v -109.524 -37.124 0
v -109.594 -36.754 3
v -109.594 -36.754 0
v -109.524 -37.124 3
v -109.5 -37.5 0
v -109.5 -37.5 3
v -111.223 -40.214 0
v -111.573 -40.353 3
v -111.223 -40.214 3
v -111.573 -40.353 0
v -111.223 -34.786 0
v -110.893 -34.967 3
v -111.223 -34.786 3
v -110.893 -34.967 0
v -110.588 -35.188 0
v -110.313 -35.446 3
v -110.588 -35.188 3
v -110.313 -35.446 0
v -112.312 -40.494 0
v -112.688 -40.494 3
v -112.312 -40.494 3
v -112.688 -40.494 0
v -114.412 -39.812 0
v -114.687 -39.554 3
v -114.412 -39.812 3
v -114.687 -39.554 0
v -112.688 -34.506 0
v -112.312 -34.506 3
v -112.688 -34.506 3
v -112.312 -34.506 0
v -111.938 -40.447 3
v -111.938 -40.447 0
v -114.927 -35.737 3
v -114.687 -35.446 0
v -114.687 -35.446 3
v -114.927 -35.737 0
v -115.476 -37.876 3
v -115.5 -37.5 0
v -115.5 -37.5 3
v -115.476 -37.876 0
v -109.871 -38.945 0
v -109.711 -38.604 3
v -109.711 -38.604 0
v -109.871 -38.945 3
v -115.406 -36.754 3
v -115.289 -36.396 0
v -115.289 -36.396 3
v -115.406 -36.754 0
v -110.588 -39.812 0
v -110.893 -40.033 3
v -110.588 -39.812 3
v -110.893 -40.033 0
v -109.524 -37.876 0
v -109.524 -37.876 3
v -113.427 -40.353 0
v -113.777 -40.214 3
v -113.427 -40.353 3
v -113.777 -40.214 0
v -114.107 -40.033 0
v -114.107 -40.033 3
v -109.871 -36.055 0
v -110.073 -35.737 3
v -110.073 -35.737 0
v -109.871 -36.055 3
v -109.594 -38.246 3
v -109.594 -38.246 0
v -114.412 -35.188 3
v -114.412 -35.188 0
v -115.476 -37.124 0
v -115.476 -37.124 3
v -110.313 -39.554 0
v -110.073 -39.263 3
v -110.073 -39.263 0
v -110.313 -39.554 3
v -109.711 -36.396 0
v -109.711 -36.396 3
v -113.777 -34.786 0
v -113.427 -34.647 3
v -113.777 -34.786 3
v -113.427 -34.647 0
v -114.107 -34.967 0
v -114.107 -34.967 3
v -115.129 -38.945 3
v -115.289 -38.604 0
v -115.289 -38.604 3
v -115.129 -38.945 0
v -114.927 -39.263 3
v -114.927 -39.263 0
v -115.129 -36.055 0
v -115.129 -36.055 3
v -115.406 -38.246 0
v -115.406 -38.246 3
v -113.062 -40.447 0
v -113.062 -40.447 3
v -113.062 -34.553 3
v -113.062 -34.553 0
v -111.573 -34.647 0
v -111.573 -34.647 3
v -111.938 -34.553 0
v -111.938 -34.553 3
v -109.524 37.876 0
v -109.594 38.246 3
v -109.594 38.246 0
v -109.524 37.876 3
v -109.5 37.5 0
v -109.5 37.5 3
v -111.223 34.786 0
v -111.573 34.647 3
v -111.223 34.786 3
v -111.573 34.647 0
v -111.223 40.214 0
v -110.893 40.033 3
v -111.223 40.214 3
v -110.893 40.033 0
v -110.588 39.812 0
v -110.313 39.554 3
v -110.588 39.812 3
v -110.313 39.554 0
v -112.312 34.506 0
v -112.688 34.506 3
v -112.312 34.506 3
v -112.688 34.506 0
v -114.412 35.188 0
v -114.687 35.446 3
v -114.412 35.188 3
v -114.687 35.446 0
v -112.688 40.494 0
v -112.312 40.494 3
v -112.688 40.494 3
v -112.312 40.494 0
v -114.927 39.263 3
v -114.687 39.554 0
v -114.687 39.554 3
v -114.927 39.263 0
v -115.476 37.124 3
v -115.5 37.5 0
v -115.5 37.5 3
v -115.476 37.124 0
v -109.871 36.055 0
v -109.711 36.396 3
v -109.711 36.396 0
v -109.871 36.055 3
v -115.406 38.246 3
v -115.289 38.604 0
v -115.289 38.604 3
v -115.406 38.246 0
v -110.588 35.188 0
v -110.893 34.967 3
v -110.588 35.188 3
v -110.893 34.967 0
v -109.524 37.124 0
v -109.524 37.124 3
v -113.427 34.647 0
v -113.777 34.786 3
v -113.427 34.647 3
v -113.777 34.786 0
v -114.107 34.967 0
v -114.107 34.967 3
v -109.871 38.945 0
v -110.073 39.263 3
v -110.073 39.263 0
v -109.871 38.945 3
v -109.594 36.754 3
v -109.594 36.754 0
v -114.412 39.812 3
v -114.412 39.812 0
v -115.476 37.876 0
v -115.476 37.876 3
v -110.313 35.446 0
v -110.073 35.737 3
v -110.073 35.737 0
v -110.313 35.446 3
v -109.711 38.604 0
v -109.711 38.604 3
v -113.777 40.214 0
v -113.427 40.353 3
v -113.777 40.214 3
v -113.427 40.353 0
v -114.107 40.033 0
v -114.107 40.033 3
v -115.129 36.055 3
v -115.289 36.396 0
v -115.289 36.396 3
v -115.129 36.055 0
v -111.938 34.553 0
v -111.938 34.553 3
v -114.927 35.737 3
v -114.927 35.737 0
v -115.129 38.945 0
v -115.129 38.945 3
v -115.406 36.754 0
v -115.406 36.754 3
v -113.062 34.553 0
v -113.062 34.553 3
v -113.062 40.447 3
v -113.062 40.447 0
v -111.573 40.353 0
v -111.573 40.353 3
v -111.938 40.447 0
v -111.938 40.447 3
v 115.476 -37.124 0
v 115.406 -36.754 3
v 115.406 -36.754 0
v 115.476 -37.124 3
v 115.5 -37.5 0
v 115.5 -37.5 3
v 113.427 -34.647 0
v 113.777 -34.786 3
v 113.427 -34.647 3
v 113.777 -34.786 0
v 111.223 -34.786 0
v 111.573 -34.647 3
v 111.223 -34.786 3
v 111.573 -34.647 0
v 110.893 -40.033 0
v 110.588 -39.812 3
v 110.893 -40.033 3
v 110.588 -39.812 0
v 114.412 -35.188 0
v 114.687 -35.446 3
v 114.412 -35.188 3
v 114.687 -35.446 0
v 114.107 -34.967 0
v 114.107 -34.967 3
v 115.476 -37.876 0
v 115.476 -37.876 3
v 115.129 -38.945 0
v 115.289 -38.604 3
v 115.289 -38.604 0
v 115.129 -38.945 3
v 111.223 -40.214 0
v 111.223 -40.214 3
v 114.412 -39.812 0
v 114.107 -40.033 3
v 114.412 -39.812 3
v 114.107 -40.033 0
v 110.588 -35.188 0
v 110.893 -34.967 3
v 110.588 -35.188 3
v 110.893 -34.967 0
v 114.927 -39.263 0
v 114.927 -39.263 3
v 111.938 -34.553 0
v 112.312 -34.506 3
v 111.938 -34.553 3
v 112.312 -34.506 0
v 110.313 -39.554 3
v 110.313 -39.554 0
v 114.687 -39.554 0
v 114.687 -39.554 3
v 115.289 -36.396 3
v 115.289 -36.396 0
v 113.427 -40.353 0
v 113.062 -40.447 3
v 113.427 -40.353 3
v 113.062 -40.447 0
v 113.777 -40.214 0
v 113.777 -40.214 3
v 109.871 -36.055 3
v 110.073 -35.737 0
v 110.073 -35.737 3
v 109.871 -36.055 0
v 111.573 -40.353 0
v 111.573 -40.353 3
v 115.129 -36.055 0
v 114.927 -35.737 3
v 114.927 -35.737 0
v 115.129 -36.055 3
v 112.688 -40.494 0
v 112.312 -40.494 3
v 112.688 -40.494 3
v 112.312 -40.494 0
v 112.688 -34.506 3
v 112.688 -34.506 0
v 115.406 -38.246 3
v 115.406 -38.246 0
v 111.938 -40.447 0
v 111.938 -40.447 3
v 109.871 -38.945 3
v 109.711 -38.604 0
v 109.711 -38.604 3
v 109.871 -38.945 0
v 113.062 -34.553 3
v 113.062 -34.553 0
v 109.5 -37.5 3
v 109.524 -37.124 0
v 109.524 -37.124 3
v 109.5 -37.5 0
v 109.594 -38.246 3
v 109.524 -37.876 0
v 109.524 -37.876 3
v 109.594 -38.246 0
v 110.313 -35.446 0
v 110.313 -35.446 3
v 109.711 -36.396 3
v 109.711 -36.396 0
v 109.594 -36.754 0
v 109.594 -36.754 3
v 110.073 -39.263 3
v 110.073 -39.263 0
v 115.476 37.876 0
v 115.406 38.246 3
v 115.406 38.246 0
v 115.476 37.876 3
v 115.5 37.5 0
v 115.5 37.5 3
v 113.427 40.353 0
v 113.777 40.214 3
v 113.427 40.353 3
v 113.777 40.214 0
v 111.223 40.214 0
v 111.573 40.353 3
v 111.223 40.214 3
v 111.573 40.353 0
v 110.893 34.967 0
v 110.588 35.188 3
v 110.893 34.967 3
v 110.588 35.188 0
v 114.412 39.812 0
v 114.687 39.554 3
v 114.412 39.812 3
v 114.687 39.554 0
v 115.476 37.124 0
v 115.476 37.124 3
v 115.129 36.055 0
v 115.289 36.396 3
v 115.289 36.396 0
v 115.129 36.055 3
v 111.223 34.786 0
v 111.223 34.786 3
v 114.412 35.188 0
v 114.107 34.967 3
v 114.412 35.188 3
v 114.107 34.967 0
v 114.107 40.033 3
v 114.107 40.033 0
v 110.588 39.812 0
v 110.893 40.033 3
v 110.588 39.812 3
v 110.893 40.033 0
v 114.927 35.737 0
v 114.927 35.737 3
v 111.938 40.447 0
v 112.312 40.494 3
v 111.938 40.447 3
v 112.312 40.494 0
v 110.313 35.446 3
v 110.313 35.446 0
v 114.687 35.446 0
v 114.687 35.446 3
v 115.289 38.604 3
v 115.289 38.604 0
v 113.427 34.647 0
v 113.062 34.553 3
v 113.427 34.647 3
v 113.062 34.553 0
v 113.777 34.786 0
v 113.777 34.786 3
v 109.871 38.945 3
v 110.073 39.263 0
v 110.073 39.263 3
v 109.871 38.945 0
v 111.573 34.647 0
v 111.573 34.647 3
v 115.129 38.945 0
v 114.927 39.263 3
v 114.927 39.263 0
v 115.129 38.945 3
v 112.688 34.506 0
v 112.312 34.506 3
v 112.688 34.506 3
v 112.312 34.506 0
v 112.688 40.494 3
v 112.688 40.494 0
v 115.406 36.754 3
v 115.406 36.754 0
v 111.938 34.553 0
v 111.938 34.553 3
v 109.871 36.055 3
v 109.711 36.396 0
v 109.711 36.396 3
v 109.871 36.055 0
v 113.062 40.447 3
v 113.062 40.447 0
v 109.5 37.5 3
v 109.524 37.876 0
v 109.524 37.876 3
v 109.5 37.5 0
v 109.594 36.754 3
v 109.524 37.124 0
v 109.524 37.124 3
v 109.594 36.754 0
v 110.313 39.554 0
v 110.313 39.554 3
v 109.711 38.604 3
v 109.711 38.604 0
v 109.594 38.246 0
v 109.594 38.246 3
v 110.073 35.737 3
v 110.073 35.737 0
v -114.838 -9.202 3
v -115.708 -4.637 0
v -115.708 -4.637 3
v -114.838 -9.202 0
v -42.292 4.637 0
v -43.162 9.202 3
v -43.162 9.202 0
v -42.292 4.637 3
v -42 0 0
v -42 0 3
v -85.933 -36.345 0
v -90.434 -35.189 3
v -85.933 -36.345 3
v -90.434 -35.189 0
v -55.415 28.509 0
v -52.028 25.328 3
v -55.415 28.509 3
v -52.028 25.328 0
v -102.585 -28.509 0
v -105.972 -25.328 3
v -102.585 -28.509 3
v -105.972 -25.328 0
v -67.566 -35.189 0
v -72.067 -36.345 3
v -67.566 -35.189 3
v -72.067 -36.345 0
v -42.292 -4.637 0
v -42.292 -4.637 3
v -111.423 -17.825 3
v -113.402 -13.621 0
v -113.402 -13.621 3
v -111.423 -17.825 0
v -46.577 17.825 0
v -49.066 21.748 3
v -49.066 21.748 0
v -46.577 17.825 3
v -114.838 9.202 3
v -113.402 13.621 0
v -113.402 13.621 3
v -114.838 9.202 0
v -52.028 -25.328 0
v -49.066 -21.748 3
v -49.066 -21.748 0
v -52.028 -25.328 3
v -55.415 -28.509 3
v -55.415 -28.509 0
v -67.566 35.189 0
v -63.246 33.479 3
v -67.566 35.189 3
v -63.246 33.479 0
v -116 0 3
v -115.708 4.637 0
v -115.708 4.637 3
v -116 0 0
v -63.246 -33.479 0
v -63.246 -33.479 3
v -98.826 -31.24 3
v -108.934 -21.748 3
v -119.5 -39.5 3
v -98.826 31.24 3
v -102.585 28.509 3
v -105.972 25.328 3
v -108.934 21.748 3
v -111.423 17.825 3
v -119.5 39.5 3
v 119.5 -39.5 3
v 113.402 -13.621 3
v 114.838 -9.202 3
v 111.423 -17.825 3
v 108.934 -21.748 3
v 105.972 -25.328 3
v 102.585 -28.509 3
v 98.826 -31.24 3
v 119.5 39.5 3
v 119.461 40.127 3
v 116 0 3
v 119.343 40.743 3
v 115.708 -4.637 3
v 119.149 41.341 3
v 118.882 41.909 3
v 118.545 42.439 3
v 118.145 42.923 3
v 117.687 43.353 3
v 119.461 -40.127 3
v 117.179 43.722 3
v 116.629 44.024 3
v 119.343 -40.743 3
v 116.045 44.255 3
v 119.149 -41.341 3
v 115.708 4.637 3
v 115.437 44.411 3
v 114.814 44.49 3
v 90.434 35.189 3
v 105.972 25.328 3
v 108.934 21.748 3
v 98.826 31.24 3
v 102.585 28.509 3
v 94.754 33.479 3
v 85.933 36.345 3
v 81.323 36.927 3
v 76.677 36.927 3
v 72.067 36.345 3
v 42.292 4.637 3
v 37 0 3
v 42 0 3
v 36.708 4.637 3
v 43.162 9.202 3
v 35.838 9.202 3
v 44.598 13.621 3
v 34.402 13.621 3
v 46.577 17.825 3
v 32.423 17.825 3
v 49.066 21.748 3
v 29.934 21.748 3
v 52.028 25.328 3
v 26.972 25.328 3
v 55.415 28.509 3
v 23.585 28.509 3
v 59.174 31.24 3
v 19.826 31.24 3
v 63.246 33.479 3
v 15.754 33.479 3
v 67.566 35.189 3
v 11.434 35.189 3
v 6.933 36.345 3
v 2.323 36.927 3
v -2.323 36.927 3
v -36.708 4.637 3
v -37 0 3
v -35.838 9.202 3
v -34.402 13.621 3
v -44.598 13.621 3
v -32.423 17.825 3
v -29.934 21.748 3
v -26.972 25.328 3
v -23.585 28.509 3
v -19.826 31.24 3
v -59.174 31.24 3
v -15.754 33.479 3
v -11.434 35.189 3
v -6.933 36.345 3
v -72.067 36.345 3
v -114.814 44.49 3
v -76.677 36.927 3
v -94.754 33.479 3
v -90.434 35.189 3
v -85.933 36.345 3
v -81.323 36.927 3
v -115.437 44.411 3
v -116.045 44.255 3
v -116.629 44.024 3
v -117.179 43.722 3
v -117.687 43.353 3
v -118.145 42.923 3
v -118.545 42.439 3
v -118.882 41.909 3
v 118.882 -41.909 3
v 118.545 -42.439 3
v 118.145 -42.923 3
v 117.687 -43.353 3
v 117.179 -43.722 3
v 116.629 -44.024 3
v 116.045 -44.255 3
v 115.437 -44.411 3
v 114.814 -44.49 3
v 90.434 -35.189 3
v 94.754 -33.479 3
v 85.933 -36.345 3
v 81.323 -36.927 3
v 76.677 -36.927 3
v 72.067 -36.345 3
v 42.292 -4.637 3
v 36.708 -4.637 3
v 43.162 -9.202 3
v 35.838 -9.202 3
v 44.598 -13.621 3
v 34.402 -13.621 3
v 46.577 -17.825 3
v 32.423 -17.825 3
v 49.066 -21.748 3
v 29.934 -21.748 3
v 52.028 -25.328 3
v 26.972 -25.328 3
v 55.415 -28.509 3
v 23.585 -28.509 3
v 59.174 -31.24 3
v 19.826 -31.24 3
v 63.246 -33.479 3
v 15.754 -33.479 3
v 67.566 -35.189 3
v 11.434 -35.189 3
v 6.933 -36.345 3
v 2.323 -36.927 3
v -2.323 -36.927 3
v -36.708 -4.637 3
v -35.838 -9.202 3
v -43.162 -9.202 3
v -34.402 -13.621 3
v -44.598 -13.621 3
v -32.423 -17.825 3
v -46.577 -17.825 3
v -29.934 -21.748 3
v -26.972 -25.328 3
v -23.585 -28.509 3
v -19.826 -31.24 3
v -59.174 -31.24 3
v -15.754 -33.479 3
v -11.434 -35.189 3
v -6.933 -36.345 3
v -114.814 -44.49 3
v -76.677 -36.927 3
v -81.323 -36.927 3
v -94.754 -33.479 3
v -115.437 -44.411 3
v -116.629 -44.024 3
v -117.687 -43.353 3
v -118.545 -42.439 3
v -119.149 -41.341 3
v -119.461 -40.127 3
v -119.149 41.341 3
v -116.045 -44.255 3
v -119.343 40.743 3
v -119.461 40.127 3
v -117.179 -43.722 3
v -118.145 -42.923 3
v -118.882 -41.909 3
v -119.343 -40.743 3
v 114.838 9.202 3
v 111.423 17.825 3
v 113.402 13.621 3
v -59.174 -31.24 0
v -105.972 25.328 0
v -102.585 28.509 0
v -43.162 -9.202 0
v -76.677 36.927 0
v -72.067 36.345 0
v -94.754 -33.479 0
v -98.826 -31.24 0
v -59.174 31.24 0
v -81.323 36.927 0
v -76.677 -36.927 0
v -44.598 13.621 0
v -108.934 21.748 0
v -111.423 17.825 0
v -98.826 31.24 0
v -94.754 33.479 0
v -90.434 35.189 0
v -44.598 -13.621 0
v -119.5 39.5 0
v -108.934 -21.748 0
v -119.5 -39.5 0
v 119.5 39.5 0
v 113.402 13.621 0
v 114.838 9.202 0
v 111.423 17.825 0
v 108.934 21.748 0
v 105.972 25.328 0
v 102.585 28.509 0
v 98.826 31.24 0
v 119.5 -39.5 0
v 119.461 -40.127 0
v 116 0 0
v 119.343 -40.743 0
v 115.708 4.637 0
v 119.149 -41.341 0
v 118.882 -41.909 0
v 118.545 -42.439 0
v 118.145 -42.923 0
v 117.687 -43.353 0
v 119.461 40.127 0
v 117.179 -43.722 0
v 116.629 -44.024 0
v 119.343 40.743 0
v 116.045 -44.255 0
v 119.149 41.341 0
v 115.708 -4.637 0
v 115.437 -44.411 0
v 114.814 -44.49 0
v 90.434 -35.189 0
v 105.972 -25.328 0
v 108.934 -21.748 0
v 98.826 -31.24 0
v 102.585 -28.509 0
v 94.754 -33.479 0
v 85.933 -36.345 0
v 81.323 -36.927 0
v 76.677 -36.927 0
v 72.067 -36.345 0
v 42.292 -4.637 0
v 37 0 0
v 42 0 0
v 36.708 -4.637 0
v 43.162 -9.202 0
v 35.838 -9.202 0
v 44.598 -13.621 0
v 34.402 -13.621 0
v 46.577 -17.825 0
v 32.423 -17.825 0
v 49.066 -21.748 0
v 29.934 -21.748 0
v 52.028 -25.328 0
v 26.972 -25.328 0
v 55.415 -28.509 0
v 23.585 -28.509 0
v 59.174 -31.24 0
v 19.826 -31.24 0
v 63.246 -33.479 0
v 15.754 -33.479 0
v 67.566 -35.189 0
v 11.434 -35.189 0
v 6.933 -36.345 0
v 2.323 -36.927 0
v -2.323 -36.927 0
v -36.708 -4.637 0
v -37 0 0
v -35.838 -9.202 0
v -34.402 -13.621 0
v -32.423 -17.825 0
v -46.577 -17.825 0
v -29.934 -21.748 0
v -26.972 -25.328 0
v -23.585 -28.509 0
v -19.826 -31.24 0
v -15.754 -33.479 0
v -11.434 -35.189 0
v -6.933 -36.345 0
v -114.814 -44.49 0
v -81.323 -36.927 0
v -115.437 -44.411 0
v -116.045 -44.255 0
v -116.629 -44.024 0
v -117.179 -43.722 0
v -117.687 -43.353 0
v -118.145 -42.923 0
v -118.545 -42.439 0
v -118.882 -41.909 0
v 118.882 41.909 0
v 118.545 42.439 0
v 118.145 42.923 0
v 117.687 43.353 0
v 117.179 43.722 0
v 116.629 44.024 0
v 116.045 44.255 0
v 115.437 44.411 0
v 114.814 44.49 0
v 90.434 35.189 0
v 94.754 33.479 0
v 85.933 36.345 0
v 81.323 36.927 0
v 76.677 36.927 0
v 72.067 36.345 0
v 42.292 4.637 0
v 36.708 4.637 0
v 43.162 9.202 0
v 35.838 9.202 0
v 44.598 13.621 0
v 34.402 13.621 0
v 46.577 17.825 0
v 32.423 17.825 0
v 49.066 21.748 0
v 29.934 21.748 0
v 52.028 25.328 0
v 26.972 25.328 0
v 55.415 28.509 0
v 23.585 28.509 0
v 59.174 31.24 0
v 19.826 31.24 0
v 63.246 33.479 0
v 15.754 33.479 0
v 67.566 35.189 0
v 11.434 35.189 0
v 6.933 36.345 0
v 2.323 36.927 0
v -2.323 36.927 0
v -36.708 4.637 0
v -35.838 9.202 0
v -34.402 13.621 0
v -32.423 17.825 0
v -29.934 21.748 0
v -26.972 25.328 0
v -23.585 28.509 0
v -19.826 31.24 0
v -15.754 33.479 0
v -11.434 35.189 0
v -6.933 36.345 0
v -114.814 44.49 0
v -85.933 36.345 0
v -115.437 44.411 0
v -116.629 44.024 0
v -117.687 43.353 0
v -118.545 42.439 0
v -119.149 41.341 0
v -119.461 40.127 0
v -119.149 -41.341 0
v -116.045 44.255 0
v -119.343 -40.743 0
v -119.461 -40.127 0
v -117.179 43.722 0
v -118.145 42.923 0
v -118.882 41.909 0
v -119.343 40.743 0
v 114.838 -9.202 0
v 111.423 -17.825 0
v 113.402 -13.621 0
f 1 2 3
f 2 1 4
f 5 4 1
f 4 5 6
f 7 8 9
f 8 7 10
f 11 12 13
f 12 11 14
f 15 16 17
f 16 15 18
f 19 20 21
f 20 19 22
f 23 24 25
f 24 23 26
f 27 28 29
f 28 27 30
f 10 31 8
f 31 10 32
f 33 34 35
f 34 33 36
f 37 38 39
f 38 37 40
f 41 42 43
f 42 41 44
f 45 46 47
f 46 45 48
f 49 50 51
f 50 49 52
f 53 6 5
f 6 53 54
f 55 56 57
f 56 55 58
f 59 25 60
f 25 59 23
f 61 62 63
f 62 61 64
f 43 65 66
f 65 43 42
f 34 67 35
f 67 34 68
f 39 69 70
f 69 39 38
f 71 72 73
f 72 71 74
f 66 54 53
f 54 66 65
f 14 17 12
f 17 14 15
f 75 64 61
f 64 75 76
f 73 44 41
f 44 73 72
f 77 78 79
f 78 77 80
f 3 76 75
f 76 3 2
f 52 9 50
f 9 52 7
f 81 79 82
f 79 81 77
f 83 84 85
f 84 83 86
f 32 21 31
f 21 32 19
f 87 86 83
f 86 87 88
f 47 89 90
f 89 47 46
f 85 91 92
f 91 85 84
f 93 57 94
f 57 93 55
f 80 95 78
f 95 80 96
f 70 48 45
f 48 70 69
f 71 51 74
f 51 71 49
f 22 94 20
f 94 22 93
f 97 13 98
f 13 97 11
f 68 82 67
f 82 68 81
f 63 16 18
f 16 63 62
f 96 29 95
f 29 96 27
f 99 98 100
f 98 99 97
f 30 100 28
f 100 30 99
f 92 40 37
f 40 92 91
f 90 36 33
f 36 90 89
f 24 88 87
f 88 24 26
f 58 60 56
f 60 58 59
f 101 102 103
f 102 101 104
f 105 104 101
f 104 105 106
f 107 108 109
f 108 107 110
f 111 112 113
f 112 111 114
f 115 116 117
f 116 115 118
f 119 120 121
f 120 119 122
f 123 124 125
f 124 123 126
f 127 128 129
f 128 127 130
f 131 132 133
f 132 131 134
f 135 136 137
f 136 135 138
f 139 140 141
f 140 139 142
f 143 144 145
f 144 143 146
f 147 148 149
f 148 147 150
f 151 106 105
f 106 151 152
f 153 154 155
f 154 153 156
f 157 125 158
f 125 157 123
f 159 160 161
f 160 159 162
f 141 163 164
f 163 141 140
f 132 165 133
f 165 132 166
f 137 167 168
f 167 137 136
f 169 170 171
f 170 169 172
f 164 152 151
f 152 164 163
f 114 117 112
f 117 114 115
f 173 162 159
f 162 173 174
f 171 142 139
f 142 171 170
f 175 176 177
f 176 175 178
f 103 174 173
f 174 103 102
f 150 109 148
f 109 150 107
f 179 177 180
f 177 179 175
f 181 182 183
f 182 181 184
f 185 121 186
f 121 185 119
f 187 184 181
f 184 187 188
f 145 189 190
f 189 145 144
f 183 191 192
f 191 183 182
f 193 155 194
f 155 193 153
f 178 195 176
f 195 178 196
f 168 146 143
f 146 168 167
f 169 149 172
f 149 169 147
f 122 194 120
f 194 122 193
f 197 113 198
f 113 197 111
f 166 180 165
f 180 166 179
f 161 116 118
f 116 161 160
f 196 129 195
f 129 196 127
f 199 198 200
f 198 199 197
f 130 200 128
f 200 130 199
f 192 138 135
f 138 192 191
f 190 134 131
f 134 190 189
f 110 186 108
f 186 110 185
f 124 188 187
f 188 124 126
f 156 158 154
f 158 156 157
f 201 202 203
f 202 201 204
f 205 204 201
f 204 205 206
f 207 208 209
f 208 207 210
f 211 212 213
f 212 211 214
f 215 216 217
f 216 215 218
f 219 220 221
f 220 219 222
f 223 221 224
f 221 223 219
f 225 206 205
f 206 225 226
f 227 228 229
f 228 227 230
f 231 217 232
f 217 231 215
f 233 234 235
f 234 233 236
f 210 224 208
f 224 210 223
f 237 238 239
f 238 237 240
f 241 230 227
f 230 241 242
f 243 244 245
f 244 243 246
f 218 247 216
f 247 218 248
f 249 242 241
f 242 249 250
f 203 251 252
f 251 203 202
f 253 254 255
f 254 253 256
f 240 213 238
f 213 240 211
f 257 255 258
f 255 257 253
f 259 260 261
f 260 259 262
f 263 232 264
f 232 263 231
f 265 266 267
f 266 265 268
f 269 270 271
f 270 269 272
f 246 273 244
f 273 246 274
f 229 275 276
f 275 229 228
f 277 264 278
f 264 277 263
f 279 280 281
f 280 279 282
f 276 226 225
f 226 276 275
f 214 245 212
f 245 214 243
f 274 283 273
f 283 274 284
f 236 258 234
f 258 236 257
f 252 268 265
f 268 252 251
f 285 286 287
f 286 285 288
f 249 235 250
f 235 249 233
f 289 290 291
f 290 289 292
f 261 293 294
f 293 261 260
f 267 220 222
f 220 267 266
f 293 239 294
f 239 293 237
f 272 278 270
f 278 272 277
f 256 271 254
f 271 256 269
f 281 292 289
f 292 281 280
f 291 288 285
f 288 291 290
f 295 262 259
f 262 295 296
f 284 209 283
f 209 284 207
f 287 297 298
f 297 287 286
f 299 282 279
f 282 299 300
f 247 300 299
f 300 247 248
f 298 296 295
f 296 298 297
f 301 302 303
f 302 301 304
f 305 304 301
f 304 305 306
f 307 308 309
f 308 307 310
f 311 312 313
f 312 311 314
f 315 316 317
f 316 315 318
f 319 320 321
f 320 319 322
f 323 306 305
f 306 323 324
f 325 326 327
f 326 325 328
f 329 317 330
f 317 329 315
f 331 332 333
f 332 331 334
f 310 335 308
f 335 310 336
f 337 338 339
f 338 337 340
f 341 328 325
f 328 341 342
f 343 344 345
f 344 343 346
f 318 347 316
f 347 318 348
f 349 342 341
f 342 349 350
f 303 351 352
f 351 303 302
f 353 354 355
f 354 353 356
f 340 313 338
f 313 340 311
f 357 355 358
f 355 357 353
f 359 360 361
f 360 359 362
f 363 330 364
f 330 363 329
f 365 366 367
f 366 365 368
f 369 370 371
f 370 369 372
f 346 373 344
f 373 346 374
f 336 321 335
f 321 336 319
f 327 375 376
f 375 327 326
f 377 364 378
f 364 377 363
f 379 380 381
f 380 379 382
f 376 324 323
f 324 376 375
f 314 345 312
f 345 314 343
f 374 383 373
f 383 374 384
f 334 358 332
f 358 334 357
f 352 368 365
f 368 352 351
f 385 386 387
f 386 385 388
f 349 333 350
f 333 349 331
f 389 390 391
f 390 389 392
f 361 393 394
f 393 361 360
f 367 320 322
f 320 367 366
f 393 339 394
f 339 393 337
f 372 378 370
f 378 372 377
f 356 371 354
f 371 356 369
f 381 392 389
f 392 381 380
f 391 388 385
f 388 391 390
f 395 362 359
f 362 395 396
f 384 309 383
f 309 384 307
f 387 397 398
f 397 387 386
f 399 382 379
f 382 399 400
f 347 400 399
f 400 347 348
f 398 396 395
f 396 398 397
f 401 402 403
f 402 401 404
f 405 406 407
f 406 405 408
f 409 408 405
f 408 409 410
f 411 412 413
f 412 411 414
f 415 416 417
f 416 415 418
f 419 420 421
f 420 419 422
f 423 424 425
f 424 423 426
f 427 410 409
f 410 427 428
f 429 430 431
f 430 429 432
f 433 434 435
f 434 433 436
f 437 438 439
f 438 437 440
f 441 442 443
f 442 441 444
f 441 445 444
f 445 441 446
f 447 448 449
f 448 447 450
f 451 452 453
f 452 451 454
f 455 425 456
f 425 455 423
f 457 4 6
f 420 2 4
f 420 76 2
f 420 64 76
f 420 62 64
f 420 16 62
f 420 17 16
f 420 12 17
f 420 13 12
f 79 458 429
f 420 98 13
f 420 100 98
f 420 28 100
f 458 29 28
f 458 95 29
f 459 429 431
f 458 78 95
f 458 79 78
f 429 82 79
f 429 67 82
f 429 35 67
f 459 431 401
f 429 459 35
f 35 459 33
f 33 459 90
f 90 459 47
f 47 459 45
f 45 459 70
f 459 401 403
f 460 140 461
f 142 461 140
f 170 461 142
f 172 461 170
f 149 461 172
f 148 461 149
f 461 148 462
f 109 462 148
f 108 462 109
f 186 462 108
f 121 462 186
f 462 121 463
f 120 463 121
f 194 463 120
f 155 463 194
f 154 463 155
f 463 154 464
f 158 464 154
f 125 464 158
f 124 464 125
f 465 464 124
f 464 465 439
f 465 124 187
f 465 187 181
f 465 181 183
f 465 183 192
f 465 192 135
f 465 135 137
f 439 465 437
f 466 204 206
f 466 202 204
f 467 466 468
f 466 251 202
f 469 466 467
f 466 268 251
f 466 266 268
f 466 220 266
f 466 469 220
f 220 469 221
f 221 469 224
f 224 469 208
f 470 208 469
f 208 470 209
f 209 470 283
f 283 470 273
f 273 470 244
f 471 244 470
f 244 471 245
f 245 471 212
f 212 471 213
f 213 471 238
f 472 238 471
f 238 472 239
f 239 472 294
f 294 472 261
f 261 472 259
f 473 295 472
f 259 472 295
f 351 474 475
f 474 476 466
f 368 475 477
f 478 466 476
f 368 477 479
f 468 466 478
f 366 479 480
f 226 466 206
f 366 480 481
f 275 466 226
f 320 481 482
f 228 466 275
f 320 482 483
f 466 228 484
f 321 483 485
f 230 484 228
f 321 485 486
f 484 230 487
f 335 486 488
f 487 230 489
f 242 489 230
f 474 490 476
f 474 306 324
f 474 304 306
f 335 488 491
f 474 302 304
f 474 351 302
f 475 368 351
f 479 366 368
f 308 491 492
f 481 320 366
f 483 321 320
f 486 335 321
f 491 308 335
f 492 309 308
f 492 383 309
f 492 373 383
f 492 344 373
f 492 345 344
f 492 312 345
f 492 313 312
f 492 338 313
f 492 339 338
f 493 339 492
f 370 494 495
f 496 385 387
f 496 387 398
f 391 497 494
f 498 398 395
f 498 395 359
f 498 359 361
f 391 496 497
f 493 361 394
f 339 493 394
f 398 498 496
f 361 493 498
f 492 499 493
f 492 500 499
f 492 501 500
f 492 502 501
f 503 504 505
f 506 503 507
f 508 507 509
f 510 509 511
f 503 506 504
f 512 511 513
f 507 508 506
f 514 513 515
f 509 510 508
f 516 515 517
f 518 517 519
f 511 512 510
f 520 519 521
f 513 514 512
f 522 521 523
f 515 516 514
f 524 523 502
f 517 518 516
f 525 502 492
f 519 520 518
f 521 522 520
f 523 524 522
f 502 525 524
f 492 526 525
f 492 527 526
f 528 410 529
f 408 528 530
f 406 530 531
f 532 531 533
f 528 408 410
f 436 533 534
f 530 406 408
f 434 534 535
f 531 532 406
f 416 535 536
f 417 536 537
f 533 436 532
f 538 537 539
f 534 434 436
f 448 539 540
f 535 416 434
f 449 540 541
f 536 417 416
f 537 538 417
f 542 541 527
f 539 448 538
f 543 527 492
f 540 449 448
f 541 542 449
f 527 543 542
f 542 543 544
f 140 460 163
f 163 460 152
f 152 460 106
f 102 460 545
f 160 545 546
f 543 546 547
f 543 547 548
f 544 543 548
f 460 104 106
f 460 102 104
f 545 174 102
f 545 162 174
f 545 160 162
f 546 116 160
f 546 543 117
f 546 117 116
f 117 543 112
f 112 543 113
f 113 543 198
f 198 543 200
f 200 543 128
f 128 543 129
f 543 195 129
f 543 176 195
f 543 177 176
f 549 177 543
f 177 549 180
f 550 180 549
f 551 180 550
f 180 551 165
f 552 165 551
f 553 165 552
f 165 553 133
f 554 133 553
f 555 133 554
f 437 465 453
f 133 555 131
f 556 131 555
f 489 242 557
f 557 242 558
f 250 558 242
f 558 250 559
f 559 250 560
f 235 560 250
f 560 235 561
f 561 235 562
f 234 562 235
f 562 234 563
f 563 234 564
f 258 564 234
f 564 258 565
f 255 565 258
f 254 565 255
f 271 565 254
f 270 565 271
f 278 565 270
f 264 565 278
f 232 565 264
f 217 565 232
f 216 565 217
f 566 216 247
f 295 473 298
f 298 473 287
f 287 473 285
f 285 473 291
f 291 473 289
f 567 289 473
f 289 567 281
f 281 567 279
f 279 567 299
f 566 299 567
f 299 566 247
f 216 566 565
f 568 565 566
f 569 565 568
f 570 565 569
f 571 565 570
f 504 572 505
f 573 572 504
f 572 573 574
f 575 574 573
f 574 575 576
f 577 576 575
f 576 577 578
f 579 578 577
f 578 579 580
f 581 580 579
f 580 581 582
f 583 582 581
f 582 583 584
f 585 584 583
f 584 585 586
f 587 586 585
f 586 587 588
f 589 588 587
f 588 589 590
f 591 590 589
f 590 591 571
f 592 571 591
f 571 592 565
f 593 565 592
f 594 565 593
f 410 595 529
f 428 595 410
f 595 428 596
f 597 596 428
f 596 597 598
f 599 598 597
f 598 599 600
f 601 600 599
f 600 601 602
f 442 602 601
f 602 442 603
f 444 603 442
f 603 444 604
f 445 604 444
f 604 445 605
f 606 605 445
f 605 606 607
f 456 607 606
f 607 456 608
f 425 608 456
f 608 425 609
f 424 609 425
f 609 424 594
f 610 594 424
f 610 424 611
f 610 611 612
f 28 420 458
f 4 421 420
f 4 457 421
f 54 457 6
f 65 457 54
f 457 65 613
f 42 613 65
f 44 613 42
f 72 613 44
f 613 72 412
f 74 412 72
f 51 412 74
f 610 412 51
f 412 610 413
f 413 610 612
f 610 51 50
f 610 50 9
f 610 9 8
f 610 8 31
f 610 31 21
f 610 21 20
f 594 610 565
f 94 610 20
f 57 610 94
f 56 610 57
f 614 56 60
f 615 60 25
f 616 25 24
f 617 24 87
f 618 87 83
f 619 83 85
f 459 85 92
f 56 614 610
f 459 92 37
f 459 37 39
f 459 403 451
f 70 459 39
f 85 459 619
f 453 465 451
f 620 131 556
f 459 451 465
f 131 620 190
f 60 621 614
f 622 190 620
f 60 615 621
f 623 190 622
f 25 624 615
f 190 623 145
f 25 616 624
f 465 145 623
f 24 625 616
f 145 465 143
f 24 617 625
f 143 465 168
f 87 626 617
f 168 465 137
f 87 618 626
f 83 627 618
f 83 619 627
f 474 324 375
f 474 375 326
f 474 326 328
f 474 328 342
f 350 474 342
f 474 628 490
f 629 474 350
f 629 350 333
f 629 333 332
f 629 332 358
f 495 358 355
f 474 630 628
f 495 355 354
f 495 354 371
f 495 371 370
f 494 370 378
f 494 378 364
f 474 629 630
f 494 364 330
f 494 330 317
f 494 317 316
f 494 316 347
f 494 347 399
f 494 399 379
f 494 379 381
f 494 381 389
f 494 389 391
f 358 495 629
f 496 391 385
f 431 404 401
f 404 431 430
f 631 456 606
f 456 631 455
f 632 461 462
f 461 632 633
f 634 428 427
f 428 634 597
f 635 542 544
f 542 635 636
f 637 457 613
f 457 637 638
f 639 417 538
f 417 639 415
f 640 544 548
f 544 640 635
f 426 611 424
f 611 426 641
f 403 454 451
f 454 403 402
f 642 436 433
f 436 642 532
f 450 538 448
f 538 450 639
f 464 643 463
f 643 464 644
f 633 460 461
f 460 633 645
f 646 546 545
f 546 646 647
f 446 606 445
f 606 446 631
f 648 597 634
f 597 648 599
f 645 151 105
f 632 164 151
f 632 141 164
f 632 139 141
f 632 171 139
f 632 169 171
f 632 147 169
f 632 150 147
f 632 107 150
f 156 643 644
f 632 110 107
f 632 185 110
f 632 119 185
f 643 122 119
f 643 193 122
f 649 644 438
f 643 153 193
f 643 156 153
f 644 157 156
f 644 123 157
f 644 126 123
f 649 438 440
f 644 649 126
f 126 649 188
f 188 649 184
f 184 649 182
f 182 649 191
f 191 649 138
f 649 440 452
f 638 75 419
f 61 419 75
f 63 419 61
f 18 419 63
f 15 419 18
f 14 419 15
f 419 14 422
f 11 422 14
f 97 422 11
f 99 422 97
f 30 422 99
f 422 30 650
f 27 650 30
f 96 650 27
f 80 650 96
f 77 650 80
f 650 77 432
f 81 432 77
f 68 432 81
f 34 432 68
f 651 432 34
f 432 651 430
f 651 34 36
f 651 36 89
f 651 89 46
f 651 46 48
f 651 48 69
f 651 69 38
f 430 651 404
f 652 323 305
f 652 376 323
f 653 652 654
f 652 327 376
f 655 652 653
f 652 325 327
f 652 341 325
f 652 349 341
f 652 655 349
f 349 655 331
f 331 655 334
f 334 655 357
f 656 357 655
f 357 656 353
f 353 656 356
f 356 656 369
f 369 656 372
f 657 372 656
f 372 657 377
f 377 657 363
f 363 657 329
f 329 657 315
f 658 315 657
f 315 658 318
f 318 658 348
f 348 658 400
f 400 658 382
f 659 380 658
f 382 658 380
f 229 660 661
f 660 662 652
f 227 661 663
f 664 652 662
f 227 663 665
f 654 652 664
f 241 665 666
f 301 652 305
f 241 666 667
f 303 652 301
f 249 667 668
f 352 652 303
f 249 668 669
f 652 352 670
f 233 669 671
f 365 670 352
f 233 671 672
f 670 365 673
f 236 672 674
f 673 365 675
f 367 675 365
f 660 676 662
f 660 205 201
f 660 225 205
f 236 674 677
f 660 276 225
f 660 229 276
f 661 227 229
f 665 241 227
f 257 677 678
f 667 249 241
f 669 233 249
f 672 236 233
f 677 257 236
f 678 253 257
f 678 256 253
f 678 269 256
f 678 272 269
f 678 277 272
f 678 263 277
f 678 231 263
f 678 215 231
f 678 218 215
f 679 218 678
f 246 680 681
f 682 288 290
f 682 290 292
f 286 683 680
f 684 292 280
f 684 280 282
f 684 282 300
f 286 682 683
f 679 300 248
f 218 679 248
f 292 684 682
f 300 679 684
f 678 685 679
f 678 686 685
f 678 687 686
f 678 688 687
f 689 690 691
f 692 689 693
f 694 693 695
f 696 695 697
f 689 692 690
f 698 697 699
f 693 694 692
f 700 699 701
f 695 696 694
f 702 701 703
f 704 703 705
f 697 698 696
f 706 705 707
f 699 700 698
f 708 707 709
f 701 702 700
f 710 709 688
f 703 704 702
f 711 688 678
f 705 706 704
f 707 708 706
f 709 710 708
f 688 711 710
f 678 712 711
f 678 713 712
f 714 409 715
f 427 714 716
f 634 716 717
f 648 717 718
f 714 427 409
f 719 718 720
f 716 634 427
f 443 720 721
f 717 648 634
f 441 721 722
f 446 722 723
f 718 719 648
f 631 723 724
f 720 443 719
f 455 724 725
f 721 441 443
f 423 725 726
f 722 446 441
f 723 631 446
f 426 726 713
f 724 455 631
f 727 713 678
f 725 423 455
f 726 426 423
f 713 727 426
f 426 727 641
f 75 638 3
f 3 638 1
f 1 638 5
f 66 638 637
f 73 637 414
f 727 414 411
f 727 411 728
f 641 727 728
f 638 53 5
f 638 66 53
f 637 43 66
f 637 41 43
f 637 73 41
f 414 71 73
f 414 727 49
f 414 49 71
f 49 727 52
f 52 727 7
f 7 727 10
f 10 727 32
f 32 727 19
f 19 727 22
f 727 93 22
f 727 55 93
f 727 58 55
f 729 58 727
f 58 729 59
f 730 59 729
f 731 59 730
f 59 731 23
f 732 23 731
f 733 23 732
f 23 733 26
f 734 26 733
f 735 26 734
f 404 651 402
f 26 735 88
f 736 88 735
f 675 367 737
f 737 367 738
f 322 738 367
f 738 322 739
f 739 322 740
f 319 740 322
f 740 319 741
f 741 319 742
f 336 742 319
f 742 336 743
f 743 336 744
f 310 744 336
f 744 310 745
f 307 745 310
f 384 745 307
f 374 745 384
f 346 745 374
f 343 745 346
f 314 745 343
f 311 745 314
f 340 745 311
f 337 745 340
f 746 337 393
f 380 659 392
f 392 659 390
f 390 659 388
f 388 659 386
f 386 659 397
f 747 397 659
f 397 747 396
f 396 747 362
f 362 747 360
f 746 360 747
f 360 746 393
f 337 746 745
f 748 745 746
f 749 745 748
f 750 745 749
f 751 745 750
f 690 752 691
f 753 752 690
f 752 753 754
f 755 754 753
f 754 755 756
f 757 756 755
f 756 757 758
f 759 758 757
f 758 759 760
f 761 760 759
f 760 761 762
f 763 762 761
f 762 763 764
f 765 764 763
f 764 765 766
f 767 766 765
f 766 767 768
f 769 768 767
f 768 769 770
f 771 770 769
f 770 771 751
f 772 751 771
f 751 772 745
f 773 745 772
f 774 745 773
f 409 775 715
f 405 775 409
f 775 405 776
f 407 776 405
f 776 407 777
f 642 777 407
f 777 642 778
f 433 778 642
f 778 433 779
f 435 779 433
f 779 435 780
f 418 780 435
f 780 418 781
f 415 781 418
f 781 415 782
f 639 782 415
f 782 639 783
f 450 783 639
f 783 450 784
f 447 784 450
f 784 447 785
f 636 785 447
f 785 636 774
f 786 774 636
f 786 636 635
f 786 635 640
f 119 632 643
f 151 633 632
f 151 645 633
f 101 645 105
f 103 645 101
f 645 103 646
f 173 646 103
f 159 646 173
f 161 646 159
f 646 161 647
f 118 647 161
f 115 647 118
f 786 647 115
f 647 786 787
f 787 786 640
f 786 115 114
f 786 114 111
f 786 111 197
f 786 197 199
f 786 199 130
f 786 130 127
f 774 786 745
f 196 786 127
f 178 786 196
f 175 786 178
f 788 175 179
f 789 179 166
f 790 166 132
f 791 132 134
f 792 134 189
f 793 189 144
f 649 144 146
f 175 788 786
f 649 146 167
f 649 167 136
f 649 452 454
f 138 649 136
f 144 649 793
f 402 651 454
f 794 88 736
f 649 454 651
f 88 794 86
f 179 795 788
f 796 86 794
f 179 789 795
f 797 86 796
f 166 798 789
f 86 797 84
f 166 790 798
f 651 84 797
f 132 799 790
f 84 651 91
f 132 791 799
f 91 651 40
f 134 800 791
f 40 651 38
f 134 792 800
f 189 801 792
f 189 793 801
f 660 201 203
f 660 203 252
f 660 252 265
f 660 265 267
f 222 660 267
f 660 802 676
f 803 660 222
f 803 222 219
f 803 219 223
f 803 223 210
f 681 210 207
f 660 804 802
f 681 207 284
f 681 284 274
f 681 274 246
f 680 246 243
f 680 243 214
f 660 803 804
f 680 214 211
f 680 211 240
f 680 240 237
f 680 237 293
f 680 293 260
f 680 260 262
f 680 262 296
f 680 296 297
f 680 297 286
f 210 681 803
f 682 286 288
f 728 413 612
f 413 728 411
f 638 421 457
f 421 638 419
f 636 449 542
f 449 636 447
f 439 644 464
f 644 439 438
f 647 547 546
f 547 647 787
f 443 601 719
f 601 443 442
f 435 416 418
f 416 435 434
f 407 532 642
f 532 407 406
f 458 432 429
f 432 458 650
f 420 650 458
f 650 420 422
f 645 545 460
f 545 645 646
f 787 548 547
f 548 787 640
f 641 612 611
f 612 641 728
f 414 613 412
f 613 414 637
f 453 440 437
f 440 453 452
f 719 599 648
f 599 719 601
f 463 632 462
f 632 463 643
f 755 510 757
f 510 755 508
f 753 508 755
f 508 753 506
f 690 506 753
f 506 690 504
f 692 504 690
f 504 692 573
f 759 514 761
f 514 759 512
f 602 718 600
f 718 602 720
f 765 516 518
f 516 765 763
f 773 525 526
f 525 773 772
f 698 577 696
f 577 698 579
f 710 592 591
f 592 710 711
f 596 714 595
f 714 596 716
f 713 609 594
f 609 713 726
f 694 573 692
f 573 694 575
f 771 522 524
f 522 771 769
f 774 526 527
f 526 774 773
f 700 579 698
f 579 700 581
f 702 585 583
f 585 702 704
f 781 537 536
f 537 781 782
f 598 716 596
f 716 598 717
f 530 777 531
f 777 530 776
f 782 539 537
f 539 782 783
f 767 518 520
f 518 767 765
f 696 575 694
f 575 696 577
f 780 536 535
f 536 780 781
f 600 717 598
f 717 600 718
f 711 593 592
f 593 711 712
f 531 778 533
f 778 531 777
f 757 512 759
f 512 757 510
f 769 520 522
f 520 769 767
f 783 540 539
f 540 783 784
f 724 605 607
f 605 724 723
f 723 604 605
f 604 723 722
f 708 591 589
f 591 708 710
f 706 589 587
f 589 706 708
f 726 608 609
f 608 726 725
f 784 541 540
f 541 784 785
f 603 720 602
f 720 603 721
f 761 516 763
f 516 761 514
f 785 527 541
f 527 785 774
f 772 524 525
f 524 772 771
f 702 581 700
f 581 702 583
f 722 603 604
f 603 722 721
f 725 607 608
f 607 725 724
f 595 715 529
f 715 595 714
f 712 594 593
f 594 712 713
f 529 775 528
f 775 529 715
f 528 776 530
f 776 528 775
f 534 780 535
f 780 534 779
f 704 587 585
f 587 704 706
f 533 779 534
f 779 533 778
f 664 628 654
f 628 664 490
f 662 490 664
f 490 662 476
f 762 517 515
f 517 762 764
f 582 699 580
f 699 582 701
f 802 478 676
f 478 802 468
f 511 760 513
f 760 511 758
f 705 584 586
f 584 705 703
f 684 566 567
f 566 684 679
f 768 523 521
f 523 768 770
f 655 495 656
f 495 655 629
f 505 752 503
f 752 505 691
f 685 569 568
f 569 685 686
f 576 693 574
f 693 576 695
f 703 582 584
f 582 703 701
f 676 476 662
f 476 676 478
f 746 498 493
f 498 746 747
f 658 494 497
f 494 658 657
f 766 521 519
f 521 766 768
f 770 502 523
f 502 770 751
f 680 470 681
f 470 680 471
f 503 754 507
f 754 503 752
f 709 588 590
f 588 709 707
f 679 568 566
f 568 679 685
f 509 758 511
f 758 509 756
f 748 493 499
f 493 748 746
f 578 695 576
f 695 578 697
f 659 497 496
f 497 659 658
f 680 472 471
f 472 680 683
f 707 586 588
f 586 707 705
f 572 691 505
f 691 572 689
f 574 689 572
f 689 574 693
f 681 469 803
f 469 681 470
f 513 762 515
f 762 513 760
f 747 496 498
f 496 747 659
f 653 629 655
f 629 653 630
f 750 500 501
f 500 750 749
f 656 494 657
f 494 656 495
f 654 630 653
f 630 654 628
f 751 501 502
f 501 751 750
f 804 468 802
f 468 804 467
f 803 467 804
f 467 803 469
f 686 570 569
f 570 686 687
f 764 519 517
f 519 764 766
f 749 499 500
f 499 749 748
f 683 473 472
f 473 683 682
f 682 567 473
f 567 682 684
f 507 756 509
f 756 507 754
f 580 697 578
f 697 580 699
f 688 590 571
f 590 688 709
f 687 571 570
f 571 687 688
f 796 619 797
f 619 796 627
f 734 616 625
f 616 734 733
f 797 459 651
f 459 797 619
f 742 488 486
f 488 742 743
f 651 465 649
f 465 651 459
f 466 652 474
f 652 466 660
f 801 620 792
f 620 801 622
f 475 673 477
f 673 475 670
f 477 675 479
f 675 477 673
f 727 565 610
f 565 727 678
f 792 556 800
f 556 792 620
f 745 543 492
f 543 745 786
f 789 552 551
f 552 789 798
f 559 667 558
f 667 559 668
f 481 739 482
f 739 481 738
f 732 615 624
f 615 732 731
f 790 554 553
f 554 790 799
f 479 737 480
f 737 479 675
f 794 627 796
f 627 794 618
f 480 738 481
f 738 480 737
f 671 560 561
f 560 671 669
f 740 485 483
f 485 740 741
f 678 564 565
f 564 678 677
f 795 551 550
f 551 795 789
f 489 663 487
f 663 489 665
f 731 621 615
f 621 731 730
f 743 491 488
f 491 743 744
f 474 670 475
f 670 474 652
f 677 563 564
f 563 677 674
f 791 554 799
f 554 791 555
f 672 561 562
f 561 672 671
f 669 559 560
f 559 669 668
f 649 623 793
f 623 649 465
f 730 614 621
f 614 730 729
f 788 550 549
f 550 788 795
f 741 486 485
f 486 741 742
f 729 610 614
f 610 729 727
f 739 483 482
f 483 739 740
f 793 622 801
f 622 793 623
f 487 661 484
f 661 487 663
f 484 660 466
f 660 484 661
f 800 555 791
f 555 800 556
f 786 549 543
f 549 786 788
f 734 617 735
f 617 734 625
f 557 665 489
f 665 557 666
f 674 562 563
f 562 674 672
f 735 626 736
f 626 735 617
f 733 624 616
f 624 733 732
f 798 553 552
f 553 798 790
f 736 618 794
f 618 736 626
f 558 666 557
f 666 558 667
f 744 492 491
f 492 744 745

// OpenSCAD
$fn = 50;


difference() {
	union() {
		hull() {
			translate(v = [-114.5000000000, 39.5000000000, 0]) {
				cylinder(h = 3, r = 5);
			}
			translate(v = [114.5000000000, 39.5000000000, 0]) {
				cylinder(h = 3, r = 5);
			}
			translate(v = [-114.5000000000, -39.5000000000, 0]) {
				cylinder(h = 3, r = 5);
			}
			translate(v = [114.5000000000, -39.5000000000, 0]) {
				cylinder(h = 3, r = 5);
			}
		}
	}
	union() {
		#translate(v = [-112.5000000000, -37.5000000000, -100.0000000000]) {
			cylinder(h = 200, r = 3.0000000000);
		}
		#translate(v = [-112.5000000000, 37.5000000000, -100.0000000000]) {
			cylinder(h = 200, r = 3.0000000000);
		}
		#translate(v = [112.5000000000, -37.5000000000, -100.0000000000]) {
			cylinder(h = 200, r = 3.0000000000);
		}
		#translate(v = [112.5000000000, 37.5000000000, -100.0000000000]) {
			cylinder(h = 200, r = 3.0000000000);
		}
		#translate(v = [-79.0000000000, 0, 0]) {
			cylinder(h = 3, r = 37.0000000000);
		}
		#cylinder(h = 3, r = 37.0000000000);
		#translate(v = [79.0000000000, 0, 0]) {
			cylinder(h = 3, r = 37.0000000000);
		}
	}
}
